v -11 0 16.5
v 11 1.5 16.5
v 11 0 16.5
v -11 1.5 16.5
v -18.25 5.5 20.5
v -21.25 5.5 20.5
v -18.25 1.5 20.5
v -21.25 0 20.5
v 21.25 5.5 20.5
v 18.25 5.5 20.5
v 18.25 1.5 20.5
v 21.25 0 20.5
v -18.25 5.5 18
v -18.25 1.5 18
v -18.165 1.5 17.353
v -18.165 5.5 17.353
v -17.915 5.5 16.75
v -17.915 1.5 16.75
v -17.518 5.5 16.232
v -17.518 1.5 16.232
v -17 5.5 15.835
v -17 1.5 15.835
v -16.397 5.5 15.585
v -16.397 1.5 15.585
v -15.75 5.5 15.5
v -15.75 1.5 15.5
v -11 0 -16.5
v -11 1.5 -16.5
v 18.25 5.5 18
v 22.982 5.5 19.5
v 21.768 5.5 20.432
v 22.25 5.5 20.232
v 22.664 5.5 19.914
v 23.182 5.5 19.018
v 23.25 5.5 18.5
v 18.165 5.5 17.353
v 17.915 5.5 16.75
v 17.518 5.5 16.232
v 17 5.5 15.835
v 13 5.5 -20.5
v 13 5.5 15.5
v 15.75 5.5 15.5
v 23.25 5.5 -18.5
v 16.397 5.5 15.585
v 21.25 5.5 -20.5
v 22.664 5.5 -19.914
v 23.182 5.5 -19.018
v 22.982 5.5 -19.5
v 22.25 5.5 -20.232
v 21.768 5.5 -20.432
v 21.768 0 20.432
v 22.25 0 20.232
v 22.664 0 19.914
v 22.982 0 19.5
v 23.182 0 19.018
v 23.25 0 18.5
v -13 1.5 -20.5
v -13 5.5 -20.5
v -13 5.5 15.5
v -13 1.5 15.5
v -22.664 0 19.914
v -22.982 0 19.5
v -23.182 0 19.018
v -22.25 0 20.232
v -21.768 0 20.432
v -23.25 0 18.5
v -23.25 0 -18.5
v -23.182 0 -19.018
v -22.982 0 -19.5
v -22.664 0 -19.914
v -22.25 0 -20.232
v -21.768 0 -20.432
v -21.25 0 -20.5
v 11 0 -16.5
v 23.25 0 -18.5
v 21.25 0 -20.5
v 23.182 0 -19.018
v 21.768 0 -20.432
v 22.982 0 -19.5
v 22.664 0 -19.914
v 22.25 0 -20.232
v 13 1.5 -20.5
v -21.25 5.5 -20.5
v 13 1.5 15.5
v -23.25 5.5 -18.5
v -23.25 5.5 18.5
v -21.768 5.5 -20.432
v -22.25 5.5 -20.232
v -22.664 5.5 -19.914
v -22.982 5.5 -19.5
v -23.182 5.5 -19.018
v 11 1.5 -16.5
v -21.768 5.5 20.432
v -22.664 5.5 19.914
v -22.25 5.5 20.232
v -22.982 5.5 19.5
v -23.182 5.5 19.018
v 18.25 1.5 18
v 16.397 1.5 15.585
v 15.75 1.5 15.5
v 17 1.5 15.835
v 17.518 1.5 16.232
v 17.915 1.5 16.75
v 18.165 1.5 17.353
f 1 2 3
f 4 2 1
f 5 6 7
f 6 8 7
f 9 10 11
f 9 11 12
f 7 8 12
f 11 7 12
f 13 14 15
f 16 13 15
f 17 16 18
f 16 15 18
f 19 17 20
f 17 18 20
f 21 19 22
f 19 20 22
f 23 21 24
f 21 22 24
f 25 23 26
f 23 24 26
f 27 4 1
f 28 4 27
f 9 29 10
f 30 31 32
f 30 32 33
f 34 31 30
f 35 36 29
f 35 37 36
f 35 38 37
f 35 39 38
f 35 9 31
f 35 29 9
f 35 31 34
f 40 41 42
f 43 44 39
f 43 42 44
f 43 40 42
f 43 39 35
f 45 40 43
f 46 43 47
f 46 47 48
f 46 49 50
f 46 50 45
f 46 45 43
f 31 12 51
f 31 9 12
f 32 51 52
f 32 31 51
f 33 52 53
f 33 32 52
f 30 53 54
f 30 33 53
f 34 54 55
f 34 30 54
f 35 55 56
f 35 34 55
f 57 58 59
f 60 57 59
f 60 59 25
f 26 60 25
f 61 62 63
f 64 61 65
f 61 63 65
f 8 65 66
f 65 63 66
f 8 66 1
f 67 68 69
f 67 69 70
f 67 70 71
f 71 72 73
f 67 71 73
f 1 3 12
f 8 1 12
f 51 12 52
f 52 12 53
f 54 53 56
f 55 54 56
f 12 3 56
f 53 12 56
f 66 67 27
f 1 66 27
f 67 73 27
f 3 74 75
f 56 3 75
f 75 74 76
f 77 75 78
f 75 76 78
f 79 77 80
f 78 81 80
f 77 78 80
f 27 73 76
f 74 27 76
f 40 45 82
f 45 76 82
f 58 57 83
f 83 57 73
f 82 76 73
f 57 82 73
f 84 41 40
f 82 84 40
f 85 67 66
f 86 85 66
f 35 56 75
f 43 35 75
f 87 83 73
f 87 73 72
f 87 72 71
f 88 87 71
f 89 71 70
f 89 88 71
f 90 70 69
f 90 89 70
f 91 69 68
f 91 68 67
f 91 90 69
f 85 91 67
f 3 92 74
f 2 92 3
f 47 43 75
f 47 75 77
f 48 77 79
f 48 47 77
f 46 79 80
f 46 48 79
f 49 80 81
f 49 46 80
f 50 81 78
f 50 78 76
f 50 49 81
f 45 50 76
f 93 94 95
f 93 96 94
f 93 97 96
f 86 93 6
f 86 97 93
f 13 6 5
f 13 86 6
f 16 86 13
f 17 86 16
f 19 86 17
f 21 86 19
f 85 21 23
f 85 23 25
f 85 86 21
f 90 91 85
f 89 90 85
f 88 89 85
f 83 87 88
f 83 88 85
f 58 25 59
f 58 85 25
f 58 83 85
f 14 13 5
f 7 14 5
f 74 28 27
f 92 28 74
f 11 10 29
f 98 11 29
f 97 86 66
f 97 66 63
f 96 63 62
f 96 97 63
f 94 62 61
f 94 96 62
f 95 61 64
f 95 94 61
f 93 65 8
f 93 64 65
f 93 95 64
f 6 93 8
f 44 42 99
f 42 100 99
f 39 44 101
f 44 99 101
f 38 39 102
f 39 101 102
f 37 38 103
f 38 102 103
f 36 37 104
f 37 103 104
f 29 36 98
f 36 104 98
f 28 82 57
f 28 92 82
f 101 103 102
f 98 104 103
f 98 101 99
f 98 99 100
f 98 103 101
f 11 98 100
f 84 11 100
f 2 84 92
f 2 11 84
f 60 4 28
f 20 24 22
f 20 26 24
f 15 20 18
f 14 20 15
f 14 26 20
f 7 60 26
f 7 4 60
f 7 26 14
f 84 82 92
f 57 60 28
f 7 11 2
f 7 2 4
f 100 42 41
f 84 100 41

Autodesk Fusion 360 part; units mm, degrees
sketch "Sketch1" plane through (0, 0, 0) normal (0, 1, 0) x (1, 0, 0)
  line L0 (23.25, 20.5) -> (-23.25, 20.5)
  line L1 (-23.25, 20.5) -> (-23.25, -20.5)
  line L2 (-23.25, -20.5) -> (23.25, -20.5)
  line L3 (23.25, -20.5) -> (23.25, 20.5)
  line L4 (23.25, 20.5) -> (-23.25, -20.5) construction
  line L5 (-23.25, 20.5) -> (23.25, -20.5) construction
  dimension "d1" = 46.5
  dimension "d2" = 41
extrude "Extrude1" add sketch "Sketch1" along normal blind 5.5
sketch "Sketch2" plane through (0, 5.5, 0) normal (0, 1, 0) x (-1, 0, 0)
  line L0 (-23.25, 20.5) -> (-23.25, -20.5)
  line L1 (-23.25, -20.5) -> (23.25, -20.5)
  line L2 (23.25, -20.5) -> (23.25, 20.5)
  line L3 (23.25, 20.5) -> (-23.25, 20.5)
  line L4 (-13, -20.5) -> (13, -20.5)
  line L5 (13, -20.5) -> (13, 20.5)
  line L6 (13, 20.5) -> (-13, 20.5)
  line L7 (-13, 20.5) -> (-13, -20.5)
  line L8 (-13, -20.5) -> (13, 20.5) construction
  line L9 (13, -20.5) -> (-13, 20.5) construction
  line L10 (18.25, 20.5) -> (-18.25, 20.5)
  line L11 (-18.25, 20.5) -> (-18.25, 15.5)
  line L12 (-18.25, 15.5) -> (18.25, 15.5)
  line L13 (18.25, 15.5) -> (18.25, 20.5)
  dimension "d5" = 26
  dimension "d6" = 5
  dimension "d7" = 5
  dimension "d8" = 5
extrude "Extrude2" cut sketch "Sketch2" against normal blind 4 contours L3 L7 L10 L11 L12 | L1 L4 L5 L7 L12 | L3 L5 L6 L7 L10 L12 | L3 L5 L10 L12 L13
fillet "Fillet1" radius 2.5 1 edges at (-18.25, 3.5, 15.5)
fillet "Fillet1" radius 2.5 1 edges at (18.25, 3.5, 15.5)
sketch "Sketch3" plane through (0, 1.5, 0) normal (0, 1, 0) x (-1, 0, 0)
  arc A0 (-18.25, 18) -> (-15.75, 15.5) centre (-15.75, 18) ccw
  line L0 (-15.75, 15.5) -> (-13, 15.5)
  line L1 (-13, 15.5) -> (-13, -20.5)
  line L2 (-13, -20.5) -> (13, -20.5)
  line L3 (13, -20.5) -> (13, 15.5)
  line L4 (13, 15.5) -> (15.75, 15.5)
  arc A1 (15.75, 15.5) -> (18.25, 18) centre (15.75, 18) ccw
  line L5 (18.25, 18) -> (18.25, 20.5)
  line L6 (18.25, 20.5) -> (-18.25, 20.5)
  line L7 (-18.25, 20.5) -> (-18.25, 18)
  line L8 (11, -16.5) -> (-11, -16.5)
  line L9 (-11, -16.5) -> (-11, 16.5)
  line L10 (-11, 16.5) -> (11, 16.5)
  line L11 (11, 16.5) -> (11, -16.5)
  dimension "d15" = 2
  dimension "d16" = 2
  dimension "d17" = 4
  dimension "d18" = 4
extrude "Extrude3" cut sketch "Sketch3" against normal blind 2 contours L8 L9 L10 L11
fillet "Fillet2" radius 2 1 edges at (-23.25, 2.75, 20.5)
fillet "Fillet2" radius 2 1 edges at (23.25, 2.75, 20.5)
fillet "Fillet2" radius 2 1 edges at (23.25, 2.75, -20.5)
fillet "Fillet2" radius 2 1 edges at (-23.25, 2.75, -20.5)
